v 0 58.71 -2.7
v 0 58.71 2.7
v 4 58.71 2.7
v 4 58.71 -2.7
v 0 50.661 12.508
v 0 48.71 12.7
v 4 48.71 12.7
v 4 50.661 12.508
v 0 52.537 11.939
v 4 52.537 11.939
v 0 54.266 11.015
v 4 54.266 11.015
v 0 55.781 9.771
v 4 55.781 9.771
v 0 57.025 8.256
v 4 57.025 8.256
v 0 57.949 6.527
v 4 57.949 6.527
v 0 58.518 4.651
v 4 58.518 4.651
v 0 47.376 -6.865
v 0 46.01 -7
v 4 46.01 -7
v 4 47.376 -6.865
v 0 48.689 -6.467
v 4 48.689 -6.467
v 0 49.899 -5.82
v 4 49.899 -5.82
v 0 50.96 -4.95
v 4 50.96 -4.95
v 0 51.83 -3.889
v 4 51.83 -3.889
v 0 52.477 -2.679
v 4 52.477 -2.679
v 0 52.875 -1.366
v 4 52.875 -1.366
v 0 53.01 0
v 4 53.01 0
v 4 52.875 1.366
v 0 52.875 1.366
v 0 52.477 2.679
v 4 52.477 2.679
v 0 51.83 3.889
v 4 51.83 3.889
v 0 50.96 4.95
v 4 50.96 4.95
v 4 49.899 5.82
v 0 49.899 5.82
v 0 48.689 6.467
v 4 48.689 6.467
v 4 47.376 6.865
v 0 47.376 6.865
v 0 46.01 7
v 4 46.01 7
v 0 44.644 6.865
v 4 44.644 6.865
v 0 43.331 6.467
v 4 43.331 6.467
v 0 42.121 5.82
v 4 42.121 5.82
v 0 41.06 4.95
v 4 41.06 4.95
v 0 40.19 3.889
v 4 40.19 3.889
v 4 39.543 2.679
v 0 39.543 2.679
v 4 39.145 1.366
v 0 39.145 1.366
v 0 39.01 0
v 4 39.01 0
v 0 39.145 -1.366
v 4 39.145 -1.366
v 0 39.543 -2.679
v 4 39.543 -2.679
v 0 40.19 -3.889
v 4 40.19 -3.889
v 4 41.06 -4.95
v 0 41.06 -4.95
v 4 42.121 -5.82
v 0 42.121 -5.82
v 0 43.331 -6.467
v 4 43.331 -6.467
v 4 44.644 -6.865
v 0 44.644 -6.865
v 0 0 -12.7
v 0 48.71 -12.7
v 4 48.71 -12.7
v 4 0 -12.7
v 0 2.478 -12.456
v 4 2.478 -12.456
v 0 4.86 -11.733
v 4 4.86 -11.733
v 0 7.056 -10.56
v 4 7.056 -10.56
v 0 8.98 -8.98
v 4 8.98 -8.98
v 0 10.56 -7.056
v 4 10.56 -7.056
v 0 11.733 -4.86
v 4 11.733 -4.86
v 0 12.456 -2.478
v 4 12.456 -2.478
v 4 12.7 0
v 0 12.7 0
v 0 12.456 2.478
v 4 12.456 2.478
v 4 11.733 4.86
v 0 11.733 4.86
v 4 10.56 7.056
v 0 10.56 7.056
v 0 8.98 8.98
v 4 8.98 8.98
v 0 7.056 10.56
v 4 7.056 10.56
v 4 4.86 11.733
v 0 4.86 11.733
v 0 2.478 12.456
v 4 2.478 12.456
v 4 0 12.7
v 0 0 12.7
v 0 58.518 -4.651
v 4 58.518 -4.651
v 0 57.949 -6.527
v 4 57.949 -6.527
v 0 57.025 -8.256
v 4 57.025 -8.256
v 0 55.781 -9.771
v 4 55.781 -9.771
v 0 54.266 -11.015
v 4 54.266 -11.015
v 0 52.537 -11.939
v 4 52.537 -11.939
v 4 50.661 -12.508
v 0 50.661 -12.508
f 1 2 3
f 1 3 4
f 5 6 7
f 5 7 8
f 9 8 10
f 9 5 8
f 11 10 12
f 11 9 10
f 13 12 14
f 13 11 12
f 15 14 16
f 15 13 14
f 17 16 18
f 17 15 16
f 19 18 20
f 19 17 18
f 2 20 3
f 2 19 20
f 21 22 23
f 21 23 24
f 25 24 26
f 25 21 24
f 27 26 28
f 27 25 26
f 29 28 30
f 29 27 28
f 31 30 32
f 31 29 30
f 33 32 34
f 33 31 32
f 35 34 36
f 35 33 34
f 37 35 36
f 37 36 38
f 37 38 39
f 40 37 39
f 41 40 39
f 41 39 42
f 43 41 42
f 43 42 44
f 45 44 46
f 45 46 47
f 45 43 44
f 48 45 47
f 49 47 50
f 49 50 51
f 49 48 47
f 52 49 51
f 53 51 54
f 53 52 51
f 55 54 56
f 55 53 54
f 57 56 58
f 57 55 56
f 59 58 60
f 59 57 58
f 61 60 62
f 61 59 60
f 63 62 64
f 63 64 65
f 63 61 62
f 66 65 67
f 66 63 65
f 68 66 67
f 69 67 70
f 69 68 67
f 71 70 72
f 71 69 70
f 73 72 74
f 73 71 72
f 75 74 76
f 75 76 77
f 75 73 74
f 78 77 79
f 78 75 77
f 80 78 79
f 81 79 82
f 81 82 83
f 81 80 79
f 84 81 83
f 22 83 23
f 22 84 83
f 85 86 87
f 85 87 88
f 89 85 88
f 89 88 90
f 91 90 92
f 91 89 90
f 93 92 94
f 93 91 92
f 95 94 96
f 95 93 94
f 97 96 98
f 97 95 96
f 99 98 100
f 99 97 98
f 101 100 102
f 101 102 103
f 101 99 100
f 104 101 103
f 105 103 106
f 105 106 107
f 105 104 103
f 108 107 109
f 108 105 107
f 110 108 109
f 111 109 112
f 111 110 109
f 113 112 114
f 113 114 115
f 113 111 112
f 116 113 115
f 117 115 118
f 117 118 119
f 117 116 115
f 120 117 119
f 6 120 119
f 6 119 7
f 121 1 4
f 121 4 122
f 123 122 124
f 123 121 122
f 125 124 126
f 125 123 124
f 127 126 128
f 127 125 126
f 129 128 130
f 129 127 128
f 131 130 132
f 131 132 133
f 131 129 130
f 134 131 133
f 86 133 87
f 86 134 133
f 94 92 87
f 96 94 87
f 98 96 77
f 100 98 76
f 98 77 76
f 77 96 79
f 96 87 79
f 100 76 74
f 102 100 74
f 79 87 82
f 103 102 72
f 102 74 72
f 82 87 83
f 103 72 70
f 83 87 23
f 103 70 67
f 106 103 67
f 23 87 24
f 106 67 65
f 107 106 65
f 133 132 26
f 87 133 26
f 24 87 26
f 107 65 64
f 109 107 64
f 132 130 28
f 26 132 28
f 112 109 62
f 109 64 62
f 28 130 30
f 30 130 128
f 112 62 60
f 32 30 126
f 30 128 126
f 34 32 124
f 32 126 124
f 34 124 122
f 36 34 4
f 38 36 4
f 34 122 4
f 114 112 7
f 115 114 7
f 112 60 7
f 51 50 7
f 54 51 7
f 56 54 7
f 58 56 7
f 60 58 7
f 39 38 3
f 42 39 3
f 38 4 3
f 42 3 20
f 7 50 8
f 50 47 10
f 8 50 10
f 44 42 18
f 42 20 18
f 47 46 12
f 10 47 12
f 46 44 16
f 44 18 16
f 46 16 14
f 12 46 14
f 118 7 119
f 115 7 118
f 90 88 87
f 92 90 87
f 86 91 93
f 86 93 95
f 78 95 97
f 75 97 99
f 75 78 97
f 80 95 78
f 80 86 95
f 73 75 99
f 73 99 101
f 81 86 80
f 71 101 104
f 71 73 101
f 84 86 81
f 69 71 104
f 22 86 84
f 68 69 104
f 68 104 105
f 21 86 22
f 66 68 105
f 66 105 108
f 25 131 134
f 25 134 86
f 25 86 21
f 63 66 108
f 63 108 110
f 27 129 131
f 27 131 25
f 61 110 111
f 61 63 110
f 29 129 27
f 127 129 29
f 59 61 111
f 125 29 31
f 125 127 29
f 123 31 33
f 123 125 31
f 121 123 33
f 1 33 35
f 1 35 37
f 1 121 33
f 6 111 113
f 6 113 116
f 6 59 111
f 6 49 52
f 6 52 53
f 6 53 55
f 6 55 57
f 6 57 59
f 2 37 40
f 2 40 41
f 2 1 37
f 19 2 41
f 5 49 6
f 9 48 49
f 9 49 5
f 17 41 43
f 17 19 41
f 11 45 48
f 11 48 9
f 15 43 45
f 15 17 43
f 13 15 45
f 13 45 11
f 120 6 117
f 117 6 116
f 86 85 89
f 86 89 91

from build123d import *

# Parameters (mm, degrees)
SKETCH1_R           = 7
BOSS_EXTRUDE1_DEPTH = 4


with BuildPart() as part:
    # Sketch1 → Boss-Extrude1 (new body)
    with BuildSketch(Plane(origin=(0, 0, 0), x_dir=(0, 0, -1), z_dir=(1, 0, 0))):
        with BuildLine():
            Line((-12.7, 0), (-12.7, 48.71))
            ThreePointArc((-12.7, 48.71), (-9.771067812, 55.781067812), (-2.7, 58.71))
            Line((-2.7, 58.71), (2.7, 58.71))
            ThreePointArc((2.7, 58.71), (9.771067812, 55.781067812), (12.7, 48.71))
            Line((12.7, 48.71), (12.7, 0))
            ThreePointArc((12.7, 0), (0, 12.7), (-12.7, 0))
        make_face()
        with Locations((0, 46.01)):
            Circle(SKETCH1_R, mode=Mode.SUBTRACT)
    extrude(amount=BOSS_EXTRUDE1_DEPTH)


solid = part.part
